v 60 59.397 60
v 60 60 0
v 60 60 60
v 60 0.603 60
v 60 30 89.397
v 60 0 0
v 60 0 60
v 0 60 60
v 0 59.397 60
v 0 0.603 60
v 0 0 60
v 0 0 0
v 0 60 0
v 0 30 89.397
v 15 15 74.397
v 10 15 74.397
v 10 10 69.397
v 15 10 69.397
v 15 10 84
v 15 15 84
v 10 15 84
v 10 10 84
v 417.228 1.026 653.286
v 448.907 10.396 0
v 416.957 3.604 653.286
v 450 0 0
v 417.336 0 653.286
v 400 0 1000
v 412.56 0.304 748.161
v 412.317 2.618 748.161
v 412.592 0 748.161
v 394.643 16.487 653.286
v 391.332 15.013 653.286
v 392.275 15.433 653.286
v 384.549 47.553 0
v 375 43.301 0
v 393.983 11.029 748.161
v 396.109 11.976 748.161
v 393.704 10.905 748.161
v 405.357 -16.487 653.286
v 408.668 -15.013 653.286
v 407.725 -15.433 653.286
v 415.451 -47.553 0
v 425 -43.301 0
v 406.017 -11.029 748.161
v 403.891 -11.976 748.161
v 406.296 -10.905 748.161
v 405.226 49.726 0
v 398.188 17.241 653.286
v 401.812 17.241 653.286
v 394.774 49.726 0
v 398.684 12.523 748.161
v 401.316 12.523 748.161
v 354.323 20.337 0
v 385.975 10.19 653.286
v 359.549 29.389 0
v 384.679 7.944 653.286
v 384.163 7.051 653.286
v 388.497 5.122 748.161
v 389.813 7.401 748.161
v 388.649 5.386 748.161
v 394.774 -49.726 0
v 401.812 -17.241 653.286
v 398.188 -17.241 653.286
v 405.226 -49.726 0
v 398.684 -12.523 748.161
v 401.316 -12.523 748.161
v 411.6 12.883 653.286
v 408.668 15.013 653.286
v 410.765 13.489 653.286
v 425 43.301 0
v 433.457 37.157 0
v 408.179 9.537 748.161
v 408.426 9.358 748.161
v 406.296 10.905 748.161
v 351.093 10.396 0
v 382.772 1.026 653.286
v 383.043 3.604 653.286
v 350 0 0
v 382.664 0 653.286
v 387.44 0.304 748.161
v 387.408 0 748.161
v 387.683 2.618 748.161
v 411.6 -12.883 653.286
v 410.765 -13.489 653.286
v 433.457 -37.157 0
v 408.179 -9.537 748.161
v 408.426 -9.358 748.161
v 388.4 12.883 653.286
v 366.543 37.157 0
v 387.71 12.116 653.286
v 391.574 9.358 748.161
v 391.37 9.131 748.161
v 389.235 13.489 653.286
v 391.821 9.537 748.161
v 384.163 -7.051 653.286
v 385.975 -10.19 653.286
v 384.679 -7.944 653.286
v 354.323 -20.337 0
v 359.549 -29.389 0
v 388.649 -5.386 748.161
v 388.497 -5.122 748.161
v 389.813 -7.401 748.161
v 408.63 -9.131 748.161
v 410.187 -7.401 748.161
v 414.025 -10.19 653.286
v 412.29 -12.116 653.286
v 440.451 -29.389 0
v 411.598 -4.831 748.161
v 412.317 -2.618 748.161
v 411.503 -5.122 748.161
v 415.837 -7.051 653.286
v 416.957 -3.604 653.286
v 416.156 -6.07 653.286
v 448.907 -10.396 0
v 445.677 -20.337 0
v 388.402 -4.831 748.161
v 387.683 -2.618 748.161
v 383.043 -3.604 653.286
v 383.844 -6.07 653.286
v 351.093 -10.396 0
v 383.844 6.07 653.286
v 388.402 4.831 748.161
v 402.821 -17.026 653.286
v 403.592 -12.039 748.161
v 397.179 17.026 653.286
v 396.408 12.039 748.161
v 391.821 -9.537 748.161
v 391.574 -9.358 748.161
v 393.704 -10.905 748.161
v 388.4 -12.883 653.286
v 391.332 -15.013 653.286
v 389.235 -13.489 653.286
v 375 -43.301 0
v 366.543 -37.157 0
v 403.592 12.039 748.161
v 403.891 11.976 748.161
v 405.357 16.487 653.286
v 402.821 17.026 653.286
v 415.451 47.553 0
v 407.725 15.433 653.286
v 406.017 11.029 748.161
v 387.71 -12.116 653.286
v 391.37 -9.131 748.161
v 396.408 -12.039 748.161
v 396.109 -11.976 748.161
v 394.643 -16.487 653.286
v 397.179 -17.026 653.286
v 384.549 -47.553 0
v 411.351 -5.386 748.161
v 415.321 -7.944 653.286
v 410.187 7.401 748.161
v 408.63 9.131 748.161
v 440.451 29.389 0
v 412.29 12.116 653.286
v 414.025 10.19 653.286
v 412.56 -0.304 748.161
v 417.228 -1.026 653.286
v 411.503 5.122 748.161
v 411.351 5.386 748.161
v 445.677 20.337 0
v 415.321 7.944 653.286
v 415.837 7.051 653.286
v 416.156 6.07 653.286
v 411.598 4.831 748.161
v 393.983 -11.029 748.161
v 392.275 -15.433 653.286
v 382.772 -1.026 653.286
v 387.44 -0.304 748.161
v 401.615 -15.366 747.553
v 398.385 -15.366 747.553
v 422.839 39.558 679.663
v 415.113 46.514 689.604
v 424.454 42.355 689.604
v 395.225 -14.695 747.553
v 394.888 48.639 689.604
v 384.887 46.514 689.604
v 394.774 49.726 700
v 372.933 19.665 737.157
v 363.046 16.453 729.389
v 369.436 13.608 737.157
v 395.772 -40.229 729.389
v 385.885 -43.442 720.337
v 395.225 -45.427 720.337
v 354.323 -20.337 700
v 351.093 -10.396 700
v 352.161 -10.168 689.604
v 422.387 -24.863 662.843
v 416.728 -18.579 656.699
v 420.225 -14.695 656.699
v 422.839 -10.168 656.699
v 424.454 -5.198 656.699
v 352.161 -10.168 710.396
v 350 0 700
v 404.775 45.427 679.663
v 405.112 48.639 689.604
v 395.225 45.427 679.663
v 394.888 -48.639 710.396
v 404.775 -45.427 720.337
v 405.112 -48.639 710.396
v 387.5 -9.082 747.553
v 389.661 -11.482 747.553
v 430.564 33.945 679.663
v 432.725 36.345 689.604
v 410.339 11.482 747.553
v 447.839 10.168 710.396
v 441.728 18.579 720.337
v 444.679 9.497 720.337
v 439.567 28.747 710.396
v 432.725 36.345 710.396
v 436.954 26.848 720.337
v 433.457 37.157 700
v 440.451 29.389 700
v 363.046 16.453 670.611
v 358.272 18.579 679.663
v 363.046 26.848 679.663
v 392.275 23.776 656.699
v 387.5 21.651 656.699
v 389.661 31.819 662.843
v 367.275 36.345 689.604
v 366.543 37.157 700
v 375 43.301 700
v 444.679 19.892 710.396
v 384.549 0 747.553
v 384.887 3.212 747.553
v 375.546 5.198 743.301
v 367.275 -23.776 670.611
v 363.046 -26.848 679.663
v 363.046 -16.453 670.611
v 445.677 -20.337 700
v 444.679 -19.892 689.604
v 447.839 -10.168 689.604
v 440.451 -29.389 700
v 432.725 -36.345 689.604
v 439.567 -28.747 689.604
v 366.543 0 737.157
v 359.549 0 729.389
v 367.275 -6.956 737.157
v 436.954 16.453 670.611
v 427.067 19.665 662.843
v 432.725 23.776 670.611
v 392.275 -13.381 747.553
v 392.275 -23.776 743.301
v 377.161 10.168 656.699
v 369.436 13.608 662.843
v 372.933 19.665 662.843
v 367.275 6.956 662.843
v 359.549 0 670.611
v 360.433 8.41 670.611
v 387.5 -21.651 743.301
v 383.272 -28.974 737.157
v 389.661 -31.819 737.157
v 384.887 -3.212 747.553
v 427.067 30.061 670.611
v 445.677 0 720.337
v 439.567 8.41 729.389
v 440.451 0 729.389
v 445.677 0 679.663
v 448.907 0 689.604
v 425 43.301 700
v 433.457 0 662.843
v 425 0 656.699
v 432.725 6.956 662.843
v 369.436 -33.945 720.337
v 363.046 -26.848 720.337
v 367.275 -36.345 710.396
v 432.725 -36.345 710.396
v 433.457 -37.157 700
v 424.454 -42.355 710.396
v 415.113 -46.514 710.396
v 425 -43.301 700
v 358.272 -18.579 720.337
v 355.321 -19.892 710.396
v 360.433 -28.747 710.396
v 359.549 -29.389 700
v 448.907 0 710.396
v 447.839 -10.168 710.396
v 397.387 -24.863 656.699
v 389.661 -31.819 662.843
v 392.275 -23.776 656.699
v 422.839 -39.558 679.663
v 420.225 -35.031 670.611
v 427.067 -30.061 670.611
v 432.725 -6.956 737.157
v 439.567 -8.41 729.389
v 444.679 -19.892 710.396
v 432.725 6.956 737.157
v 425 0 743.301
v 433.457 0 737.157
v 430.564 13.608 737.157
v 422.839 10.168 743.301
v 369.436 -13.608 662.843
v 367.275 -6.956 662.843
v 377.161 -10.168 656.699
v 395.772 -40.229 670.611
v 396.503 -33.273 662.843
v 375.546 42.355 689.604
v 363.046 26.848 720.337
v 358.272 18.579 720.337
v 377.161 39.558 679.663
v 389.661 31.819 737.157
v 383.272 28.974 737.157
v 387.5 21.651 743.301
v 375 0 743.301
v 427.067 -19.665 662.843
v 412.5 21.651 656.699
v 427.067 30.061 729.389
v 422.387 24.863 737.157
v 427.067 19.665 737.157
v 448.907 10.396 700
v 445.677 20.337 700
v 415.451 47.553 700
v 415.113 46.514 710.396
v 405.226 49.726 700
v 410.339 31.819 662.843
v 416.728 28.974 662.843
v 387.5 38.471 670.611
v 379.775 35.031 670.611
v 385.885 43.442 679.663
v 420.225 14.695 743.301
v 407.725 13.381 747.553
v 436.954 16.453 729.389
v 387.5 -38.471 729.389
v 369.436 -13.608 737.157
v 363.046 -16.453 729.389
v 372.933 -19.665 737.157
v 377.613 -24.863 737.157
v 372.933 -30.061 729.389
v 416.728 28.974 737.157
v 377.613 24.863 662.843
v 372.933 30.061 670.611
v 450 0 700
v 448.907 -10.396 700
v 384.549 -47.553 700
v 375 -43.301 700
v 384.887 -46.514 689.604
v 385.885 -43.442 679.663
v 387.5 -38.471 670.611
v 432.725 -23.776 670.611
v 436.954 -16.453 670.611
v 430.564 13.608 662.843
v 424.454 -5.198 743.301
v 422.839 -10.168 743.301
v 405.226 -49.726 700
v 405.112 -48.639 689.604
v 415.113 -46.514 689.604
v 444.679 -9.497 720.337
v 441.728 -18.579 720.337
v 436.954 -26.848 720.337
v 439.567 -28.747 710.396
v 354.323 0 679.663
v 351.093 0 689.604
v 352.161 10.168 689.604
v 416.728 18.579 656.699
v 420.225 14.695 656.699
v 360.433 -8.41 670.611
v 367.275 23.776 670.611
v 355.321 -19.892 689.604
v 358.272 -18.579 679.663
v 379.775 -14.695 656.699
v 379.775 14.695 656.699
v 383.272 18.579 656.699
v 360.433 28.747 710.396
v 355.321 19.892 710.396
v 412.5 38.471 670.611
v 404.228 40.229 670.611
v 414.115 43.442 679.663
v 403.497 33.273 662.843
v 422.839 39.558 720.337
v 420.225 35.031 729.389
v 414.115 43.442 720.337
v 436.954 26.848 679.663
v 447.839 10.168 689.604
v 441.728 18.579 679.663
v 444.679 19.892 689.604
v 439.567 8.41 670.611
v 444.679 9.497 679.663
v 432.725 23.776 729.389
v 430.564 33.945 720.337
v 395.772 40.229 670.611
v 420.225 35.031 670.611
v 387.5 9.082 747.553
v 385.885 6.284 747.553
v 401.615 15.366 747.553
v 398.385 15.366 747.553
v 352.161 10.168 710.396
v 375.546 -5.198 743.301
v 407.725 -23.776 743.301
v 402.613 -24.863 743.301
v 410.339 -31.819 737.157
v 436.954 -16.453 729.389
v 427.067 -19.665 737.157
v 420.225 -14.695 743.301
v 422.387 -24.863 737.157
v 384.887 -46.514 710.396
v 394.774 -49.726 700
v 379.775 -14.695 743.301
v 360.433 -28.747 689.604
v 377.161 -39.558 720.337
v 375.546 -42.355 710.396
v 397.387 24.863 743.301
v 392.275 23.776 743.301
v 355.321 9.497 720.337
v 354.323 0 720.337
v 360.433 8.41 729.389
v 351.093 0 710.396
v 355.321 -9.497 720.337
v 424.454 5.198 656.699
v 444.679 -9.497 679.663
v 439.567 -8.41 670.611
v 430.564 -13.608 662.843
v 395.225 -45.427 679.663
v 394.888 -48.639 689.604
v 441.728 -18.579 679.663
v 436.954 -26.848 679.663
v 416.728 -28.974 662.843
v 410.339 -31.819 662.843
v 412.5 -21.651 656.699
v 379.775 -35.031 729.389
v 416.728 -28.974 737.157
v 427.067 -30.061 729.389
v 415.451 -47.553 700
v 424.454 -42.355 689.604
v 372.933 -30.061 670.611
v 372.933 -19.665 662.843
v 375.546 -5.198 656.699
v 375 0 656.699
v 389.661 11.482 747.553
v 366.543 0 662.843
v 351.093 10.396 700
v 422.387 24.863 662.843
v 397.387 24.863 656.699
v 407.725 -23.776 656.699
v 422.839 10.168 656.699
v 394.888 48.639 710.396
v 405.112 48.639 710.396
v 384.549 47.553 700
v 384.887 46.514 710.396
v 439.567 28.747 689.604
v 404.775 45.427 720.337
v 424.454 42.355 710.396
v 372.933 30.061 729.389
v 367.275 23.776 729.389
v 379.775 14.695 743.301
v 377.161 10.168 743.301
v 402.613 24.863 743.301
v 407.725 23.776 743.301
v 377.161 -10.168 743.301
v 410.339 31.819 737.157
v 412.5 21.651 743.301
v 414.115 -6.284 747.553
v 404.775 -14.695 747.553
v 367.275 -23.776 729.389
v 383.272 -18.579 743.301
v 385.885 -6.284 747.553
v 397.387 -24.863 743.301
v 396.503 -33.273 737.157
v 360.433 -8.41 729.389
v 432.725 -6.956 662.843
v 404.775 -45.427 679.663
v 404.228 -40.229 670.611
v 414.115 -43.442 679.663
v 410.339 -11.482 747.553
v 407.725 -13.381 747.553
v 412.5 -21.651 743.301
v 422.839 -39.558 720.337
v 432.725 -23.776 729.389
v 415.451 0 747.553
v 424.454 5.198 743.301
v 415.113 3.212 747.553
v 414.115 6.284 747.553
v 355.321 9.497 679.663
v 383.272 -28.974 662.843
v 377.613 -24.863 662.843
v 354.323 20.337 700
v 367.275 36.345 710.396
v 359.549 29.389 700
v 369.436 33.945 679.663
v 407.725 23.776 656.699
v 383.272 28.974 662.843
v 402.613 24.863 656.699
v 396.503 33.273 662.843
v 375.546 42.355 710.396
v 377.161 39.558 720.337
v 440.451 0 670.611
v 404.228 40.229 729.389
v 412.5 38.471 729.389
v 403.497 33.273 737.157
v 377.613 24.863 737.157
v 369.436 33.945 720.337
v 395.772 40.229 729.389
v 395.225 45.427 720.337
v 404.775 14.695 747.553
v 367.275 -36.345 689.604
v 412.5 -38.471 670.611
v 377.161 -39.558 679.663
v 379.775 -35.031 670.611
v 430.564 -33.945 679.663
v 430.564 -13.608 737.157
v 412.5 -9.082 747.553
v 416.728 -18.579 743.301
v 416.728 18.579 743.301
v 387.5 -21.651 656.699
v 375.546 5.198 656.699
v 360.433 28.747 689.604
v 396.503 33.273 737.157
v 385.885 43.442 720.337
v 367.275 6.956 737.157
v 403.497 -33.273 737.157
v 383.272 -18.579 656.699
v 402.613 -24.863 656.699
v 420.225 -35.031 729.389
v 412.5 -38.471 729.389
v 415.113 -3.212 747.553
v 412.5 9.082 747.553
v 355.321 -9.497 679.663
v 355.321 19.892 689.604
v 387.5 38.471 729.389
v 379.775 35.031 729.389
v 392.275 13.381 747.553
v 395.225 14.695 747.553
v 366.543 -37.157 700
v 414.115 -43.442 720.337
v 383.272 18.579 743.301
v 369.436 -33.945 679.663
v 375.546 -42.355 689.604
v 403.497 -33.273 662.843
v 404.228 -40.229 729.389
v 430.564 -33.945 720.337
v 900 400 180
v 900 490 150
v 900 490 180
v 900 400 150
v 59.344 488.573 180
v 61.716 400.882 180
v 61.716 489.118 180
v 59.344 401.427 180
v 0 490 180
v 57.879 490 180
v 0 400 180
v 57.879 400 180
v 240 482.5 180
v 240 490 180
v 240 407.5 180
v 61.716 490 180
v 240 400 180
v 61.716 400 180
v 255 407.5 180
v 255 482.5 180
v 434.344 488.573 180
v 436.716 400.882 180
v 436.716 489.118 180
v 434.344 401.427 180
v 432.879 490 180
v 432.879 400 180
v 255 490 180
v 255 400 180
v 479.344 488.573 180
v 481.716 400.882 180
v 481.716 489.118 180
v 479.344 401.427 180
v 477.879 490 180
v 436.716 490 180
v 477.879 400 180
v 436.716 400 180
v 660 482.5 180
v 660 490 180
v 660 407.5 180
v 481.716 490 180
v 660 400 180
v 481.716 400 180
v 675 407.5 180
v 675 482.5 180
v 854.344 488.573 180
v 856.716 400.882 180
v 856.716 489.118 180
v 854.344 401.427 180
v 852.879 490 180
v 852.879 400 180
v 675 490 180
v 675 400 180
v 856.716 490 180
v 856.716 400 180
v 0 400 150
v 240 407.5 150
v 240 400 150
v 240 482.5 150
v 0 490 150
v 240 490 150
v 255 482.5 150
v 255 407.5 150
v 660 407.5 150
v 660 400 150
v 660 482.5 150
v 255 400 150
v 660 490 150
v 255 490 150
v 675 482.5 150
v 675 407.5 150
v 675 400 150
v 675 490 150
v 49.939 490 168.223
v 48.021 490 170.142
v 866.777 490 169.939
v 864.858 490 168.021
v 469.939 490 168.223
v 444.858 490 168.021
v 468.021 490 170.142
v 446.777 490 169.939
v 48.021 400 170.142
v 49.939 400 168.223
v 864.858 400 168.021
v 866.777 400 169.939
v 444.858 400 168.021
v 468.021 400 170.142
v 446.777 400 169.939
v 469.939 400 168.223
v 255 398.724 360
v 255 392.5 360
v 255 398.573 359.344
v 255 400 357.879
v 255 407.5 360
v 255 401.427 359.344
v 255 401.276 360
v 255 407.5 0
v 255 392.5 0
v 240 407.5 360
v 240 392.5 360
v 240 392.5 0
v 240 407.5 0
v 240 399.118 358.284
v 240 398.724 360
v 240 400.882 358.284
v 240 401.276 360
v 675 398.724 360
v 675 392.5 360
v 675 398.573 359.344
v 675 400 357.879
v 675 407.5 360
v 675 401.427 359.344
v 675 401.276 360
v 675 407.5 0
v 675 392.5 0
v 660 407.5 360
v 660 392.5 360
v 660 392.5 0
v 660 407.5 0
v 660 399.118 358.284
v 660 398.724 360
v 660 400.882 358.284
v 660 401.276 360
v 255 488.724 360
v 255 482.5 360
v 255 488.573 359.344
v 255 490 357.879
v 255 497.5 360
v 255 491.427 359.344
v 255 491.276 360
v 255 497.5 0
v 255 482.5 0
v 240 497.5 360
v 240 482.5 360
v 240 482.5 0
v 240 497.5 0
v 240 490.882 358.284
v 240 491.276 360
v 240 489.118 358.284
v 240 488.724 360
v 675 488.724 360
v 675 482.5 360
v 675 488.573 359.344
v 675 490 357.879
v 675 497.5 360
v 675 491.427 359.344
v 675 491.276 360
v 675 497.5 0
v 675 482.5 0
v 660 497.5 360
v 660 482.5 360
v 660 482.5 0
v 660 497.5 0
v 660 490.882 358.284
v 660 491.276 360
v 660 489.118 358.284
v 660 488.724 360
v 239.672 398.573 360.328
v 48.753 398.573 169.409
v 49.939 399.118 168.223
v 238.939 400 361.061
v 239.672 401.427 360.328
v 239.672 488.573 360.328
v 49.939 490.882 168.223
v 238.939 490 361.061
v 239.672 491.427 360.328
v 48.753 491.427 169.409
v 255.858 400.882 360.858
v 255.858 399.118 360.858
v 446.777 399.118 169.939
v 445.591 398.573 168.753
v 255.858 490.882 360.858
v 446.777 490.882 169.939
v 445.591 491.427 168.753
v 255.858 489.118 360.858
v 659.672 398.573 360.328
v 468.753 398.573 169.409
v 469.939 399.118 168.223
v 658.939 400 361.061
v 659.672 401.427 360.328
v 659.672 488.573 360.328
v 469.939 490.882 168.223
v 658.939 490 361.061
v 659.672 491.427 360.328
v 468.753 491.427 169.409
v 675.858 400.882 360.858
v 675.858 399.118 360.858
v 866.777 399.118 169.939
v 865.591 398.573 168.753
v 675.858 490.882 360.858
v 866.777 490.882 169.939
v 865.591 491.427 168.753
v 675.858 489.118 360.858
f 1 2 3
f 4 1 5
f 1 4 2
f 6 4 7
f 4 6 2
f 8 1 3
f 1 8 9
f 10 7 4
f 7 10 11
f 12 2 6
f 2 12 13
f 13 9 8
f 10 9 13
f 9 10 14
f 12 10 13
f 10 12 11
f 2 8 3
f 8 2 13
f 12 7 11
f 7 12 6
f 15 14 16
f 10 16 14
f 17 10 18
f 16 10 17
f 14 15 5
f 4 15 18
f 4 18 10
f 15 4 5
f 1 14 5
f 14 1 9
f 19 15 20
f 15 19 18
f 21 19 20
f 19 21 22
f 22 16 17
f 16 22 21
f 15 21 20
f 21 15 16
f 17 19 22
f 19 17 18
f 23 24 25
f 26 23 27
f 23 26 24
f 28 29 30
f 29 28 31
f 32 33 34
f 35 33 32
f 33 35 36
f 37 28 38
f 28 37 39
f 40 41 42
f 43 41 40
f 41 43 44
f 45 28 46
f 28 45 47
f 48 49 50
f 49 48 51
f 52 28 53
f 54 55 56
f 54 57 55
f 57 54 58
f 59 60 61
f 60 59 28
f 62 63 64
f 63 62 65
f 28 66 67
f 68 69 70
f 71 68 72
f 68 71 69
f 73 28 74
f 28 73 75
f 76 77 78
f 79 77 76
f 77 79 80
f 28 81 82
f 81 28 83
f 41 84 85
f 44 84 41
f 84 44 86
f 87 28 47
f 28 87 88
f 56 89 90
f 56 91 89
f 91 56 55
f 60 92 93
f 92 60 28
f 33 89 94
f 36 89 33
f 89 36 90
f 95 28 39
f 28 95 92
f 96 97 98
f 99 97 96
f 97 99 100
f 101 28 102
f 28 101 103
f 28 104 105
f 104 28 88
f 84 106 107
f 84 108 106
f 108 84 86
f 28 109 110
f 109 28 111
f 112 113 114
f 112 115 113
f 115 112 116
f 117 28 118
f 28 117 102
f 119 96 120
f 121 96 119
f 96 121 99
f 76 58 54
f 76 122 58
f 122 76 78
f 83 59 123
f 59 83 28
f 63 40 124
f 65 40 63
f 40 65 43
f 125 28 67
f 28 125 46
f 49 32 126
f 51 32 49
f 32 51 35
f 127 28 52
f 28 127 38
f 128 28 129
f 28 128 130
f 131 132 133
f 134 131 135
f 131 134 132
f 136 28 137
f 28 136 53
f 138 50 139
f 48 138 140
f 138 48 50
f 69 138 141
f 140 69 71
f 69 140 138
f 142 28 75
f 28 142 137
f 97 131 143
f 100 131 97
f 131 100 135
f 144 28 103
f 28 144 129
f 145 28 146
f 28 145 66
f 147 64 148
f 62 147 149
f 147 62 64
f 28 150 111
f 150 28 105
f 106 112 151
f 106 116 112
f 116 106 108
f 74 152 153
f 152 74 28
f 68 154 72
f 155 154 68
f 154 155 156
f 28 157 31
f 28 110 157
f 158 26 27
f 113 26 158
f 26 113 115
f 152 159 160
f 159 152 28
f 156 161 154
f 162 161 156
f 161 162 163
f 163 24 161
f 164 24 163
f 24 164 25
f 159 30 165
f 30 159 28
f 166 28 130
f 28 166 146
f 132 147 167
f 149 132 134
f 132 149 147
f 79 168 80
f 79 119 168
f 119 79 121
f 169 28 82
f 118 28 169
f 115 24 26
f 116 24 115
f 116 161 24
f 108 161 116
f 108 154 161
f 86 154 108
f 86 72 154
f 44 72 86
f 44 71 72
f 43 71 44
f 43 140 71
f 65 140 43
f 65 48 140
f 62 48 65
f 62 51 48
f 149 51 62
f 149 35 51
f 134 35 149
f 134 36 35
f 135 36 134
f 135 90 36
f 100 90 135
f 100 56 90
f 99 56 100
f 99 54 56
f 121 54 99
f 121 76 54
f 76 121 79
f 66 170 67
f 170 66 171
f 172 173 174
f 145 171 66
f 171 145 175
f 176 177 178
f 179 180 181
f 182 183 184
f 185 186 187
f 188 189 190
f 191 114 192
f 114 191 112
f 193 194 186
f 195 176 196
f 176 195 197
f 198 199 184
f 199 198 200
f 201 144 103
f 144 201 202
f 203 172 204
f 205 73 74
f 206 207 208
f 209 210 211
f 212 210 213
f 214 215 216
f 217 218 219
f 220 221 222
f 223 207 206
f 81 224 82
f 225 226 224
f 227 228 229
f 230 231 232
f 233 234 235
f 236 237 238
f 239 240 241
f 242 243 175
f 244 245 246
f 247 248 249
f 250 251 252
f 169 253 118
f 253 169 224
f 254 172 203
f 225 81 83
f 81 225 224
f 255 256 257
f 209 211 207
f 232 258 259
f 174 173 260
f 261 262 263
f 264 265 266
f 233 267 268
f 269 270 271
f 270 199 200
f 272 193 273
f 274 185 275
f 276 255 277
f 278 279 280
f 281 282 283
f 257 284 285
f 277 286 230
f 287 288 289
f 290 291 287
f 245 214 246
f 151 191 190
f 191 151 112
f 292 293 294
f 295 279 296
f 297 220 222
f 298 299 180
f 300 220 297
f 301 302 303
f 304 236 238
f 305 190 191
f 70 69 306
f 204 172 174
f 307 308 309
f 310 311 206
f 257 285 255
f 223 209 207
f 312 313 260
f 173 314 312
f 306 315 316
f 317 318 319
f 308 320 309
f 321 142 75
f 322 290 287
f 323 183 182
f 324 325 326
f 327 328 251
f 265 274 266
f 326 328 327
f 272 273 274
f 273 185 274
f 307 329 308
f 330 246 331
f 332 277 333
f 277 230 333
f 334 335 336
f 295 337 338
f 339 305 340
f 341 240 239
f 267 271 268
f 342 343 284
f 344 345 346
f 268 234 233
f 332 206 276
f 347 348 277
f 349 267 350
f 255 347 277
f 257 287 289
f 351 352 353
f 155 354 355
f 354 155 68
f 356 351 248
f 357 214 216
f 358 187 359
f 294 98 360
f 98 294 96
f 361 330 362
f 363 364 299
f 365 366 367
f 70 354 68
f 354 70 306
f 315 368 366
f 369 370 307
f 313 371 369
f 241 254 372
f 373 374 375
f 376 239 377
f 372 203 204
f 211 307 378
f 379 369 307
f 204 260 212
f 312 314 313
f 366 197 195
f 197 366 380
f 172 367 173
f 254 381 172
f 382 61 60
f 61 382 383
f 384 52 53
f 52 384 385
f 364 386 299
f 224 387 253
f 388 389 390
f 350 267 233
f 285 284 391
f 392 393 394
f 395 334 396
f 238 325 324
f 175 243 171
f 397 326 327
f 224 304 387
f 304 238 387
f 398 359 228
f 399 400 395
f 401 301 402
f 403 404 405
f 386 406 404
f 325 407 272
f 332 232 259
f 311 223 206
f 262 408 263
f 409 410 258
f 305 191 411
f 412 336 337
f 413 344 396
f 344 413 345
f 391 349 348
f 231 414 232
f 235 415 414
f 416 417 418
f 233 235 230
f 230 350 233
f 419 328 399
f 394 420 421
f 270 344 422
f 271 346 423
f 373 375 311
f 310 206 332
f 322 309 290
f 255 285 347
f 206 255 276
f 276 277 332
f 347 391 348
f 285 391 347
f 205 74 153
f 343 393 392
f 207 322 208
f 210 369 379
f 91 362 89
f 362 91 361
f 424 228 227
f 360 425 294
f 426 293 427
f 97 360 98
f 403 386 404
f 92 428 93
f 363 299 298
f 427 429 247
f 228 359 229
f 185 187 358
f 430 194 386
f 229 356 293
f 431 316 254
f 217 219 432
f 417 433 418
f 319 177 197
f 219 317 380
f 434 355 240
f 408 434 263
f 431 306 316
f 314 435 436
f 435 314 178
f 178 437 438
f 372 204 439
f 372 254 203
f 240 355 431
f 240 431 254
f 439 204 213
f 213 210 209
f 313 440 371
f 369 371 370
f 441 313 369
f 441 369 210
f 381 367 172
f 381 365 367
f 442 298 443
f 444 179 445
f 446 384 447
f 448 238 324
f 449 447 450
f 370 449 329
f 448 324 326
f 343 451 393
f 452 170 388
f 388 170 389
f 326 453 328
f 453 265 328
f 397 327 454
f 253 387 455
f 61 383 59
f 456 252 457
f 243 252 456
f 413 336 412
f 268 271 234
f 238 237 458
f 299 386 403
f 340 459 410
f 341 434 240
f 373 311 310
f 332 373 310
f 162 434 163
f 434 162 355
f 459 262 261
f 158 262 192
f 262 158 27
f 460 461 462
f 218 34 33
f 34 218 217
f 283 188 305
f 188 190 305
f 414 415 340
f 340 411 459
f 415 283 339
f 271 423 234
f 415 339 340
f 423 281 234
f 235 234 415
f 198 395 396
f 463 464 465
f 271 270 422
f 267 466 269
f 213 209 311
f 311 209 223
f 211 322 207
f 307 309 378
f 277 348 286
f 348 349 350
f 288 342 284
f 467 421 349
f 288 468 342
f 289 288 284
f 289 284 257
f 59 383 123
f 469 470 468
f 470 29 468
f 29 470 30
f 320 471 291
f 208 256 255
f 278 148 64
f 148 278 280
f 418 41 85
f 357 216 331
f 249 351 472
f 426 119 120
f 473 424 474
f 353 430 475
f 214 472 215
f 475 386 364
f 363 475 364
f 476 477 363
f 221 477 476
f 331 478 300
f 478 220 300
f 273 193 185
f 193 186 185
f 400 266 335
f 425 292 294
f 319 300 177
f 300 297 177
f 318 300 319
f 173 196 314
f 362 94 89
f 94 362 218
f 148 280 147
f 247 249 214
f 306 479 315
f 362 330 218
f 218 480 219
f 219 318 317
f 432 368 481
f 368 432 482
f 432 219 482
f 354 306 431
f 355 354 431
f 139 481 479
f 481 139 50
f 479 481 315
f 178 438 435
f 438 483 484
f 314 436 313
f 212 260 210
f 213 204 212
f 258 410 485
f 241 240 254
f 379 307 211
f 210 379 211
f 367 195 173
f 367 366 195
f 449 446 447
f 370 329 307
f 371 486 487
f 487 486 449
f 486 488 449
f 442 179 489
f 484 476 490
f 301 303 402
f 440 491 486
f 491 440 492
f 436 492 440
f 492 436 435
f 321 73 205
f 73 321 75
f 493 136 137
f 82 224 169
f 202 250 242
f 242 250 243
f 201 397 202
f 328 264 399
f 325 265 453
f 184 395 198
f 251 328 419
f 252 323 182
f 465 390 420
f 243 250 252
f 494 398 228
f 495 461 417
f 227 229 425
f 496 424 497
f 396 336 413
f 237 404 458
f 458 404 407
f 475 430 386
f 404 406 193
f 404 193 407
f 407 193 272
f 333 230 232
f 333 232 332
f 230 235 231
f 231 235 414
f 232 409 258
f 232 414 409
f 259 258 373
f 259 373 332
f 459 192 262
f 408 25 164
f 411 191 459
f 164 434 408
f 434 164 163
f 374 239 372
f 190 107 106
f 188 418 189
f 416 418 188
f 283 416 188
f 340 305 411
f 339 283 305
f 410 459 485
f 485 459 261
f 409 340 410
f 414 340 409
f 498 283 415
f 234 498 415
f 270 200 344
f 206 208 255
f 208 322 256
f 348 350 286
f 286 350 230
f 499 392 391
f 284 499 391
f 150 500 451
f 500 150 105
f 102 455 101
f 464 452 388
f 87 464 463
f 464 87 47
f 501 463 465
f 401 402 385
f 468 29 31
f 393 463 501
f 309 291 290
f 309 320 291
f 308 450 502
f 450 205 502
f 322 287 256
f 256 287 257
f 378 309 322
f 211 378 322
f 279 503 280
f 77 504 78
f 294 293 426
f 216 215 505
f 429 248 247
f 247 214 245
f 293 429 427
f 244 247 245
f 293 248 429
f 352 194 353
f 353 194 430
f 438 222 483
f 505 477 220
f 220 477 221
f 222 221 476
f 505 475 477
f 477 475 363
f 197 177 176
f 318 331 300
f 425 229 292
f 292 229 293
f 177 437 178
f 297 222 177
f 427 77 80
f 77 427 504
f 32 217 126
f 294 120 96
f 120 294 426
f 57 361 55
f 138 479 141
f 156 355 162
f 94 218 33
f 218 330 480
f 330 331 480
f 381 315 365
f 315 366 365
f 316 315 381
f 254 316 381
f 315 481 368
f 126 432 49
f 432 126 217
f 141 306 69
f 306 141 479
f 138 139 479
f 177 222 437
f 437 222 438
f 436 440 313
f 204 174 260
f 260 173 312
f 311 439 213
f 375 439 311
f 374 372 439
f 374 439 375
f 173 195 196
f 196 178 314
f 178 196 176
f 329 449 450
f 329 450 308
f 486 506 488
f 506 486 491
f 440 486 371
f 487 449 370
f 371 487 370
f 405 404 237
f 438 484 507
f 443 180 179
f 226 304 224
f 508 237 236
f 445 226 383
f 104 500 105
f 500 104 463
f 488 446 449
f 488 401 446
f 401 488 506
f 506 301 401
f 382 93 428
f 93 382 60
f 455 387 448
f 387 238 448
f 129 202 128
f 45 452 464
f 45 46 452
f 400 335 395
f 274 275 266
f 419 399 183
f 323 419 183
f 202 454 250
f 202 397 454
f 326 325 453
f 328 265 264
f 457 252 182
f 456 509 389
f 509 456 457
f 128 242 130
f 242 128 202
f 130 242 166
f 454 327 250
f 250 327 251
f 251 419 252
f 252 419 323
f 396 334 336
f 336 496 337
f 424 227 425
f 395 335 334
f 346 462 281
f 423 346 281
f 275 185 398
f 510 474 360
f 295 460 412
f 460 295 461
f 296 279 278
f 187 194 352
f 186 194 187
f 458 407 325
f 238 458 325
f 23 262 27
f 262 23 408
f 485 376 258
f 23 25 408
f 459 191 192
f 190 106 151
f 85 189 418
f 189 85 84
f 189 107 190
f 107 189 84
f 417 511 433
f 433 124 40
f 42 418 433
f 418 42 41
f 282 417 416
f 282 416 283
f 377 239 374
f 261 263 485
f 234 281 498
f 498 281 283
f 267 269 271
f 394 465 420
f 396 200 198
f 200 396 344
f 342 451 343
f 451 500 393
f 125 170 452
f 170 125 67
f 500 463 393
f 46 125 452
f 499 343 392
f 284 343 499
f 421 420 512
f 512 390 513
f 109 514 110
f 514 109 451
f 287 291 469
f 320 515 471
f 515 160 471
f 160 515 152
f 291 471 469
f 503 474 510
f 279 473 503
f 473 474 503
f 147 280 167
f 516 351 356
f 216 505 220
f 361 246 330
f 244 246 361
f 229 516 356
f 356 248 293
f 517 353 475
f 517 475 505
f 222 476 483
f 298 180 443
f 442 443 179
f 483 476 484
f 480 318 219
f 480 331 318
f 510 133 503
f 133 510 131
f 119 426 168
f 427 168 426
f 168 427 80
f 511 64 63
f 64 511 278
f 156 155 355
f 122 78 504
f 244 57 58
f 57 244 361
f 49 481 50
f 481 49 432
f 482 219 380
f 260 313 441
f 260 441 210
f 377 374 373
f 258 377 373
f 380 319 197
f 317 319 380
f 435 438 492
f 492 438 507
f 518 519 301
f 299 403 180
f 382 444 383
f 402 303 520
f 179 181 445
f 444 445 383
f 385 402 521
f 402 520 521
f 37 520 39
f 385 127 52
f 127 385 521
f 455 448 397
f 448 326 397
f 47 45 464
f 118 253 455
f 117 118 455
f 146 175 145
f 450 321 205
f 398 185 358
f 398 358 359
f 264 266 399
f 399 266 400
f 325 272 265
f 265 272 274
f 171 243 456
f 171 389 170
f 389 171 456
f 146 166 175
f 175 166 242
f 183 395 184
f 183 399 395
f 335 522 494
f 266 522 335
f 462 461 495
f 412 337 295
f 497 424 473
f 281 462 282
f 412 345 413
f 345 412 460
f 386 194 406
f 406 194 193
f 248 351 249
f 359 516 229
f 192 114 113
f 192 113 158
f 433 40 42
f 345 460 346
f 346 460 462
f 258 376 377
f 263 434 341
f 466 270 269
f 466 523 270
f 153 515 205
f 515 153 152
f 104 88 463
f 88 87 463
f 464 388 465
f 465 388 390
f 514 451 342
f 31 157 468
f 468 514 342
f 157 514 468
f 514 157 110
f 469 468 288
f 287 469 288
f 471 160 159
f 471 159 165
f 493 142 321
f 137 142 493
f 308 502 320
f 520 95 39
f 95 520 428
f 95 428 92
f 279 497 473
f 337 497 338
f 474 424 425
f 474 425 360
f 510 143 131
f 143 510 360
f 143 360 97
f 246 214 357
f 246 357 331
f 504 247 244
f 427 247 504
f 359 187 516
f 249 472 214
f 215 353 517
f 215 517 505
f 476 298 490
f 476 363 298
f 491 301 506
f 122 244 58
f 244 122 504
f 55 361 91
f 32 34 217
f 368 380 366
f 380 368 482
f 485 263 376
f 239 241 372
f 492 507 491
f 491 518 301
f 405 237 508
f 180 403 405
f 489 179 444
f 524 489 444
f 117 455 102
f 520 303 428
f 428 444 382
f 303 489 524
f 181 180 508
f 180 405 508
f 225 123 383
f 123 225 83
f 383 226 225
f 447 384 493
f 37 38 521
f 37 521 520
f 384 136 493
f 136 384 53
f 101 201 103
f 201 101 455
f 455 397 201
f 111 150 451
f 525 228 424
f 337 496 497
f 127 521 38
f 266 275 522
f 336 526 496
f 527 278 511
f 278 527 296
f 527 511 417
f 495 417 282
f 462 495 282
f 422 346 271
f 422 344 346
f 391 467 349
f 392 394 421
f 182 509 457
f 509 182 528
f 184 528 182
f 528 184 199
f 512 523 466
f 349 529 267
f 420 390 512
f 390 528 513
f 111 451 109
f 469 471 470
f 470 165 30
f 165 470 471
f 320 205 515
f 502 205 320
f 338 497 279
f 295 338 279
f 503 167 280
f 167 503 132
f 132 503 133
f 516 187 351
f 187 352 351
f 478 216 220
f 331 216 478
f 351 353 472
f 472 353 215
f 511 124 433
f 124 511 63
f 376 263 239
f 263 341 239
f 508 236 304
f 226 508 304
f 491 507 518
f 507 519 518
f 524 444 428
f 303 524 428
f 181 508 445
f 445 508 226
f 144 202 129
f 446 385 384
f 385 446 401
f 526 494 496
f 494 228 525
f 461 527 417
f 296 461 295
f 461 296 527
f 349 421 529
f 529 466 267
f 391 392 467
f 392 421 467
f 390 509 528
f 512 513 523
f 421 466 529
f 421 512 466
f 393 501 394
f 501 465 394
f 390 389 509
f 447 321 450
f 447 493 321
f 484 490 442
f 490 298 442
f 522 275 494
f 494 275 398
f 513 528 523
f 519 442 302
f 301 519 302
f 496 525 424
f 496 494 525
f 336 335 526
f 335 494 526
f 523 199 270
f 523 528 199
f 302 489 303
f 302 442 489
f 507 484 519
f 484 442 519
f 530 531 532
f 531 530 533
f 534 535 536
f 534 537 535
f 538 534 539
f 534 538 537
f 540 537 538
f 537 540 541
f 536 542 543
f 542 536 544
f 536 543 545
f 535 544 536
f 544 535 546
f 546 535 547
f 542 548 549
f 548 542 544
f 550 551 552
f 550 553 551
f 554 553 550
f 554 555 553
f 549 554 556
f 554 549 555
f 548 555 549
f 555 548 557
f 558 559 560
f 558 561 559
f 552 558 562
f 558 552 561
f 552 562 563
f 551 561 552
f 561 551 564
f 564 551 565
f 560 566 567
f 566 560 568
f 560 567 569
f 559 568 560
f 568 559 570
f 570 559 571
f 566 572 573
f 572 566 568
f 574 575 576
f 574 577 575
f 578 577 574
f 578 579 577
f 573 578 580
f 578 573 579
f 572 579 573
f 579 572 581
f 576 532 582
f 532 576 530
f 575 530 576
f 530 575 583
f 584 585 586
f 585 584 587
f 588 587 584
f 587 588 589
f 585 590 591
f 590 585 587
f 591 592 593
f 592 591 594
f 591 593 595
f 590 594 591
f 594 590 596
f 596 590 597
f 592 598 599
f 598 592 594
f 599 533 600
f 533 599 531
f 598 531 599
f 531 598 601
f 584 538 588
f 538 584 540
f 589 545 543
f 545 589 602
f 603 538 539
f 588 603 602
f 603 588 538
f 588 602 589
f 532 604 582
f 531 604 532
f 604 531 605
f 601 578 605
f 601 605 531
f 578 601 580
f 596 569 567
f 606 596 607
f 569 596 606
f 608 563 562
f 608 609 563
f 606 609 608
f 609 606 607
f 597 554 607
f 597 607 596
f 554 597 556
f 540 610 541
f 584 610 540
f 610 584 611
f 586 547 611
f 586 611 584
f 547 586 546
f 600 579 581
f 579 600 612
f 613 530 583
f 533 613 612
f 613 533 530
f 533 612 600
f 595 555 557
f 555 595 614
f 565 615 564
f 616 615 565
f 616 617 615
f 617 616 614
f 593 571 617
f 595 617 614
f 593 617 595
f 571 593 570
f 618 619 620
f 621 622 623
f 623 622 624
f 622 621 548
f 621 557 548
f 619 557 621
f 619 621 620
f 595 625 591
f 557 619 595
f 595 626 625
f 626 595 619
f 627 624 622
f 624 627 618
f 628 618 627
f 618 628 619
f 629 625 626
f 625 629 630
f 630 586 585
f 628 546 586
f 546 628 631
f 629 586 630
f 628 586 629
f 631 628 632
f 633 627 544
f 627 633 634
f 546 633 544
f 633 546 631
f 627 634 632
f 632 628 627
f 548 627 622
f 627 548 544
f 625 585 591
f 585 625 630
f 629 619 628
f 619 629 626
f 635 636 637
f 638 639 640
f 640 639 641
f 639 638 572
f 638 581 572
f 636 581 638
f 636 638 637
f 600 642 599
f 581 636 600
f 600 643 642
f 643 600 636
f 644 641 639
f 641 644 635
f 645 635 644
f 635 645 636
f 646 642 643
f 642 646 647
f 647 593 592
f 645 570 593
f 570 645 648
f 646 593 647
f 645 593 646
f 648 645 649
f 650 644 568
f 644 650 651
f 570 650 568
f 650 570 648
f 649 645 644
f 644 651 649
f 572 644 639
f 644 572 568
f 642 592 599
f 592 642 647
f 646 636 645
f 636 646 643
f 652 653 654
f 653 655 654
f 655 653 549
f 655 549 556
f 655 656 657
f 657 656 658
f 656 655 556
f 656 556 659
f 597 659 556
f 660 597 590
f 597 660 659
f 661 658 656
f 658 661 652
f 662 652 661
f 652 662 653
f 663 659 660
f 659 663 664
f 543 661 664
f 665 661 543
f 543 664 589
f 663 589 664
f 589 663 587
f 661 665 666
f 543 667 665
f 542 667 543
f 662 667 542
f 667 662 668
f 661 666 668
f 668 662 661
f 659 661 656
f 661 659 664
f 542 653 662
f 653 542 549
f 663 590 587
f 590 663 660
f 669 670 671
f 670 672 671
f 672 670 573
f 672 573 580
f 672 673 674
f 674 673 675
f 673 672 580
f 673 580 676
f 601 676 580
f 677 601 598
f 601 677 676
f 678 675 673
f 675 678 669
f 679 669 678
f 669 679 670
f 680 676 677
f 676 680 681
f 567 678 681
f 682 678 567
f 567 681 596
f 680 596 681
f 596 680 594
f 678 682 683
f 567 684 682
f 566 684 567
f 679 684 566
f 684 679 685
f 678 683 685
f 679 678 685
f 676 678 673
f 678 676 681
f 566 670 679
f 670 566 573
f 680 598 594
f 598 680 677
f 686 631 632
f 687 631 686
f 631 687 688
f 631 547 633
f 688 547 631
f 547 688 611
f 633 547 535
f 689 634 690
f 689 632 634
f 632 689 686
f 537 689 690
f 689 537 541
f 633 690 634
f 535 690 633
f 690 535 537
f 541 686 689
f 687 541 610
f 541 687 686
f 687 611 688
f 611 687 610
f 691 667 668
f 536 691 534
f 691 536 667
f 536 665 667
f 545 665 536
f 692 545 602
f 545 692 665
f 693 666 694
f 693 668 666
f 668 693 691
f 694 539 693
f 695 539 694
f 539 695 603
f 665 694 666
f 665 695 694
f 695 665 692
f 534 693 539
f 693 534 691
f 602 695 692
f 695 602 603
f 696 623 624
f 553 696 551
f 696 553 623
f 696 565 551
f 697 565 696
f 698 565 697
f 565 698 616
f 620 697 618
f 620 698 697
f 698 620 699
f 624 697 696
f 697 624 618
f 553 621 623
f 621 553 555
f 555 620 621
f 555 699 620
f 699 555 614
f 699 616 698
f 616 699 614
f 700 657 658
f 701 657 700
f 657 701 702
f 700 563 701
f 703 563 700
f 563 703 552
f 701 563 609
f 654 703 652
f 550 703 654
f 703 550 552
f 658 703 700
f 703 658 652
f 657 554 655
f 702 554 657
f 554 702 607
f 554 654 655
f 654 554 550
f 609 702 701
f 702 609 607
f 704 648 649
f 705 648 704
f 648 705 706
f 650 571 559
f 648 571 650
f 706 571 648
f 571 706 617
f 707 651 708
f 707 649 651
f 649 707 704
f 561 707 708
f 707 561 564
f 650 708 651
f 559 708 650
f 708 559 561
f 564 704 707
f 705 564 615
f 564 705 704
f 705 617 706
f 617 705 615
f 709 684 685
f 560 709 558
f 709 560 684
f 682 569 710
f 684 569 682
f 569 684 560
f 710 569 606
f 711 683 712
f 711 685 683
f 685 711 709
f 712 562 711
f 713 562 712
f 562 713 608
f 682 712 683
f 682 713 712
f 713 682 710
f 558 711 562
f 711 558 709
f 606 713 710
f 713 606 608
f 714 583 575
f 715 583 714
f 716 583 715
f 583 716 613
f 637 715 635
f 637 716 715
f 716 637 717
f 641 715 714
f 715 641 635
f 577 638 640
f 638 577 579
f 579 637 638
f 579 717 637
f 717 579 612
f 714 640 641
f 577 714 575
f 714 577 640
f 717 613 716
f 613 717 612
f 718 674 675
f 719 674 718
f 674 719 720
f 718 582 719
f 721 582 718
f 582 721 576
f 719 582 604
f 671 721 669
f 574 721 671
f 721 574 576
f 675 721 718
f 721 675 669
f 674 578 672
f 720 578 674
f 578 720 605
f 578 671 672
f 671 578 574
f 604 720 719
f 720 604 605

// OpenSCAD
// Basiskurs OpenSCAD
// uebung5.scad
// (c) berlincreators.de

house_side = 60;
house_offset = [0,0,0];
tower_height = 1000;
tower_offset = [400,0,0];
bridge_scale= 3.0;
bridge_offset = [0,400,0];
// Haus
module house(side=60) {
    cube(side);
    translate([0, 30, 30]) rotate([45,0,0]) cube([side,side*0.7,side*0.7]); 
    translate([10, 10, side*0.7]) cube([5,5,side*0.7]); 
}

// Turm
module tower(height=100) {
    cylinder(h=height, r1=height/20, r2=0);
    translate([0, 0,height * 0.7]) sphere(height/20); 
}

// Brücke
module bridge() {
    // Fahrbahn
    translate([0,0,50]) cube([300,30,10]);
    // Träger
    translate([80,-2.5,0]) cube([5,5,120]);
    translate([220,-2.5,0]) cube([5,5,120]);
    translate([80,27.5,0]) cube([5,5,120]);
    translate([220,27.5,0]) cube([5,5,120]);
    // Tragseile
    translate([80,0,120]) rotate([0,-135,0]) cylinder(d=1,h=90);
    translate([80,30,120]) rotate([0,-135,0]) cylinder(d=1,h=90);
    translate([85,0,120]) rotate([0,135,0]) cylinder(d=1,h=90);
    translate([85,30,120]) rotate([0,135,0]) cylinder(d=1,h=90);
    translate([220,0,120]) rotate([0,-135,0]) cylinder(d=1,h=90);
    translate([220,30,120]) rotate([0,-135,0]) cylinder(d=1,h=90);
    translate([225,0,120]) rotate([0,135,0]) cylinder(d=1,h=90);
    translate([225,30,120]) rotate([0,135,0]) cylinder(d=1,h=90);
}

translate(house_offset) house(house_side);
translate(tower_offset) tower(tower_height);
translate(bridge_offset) scale([bridge_scale,bridge_scale,bridge_scale]) bridge(bridge_side);
